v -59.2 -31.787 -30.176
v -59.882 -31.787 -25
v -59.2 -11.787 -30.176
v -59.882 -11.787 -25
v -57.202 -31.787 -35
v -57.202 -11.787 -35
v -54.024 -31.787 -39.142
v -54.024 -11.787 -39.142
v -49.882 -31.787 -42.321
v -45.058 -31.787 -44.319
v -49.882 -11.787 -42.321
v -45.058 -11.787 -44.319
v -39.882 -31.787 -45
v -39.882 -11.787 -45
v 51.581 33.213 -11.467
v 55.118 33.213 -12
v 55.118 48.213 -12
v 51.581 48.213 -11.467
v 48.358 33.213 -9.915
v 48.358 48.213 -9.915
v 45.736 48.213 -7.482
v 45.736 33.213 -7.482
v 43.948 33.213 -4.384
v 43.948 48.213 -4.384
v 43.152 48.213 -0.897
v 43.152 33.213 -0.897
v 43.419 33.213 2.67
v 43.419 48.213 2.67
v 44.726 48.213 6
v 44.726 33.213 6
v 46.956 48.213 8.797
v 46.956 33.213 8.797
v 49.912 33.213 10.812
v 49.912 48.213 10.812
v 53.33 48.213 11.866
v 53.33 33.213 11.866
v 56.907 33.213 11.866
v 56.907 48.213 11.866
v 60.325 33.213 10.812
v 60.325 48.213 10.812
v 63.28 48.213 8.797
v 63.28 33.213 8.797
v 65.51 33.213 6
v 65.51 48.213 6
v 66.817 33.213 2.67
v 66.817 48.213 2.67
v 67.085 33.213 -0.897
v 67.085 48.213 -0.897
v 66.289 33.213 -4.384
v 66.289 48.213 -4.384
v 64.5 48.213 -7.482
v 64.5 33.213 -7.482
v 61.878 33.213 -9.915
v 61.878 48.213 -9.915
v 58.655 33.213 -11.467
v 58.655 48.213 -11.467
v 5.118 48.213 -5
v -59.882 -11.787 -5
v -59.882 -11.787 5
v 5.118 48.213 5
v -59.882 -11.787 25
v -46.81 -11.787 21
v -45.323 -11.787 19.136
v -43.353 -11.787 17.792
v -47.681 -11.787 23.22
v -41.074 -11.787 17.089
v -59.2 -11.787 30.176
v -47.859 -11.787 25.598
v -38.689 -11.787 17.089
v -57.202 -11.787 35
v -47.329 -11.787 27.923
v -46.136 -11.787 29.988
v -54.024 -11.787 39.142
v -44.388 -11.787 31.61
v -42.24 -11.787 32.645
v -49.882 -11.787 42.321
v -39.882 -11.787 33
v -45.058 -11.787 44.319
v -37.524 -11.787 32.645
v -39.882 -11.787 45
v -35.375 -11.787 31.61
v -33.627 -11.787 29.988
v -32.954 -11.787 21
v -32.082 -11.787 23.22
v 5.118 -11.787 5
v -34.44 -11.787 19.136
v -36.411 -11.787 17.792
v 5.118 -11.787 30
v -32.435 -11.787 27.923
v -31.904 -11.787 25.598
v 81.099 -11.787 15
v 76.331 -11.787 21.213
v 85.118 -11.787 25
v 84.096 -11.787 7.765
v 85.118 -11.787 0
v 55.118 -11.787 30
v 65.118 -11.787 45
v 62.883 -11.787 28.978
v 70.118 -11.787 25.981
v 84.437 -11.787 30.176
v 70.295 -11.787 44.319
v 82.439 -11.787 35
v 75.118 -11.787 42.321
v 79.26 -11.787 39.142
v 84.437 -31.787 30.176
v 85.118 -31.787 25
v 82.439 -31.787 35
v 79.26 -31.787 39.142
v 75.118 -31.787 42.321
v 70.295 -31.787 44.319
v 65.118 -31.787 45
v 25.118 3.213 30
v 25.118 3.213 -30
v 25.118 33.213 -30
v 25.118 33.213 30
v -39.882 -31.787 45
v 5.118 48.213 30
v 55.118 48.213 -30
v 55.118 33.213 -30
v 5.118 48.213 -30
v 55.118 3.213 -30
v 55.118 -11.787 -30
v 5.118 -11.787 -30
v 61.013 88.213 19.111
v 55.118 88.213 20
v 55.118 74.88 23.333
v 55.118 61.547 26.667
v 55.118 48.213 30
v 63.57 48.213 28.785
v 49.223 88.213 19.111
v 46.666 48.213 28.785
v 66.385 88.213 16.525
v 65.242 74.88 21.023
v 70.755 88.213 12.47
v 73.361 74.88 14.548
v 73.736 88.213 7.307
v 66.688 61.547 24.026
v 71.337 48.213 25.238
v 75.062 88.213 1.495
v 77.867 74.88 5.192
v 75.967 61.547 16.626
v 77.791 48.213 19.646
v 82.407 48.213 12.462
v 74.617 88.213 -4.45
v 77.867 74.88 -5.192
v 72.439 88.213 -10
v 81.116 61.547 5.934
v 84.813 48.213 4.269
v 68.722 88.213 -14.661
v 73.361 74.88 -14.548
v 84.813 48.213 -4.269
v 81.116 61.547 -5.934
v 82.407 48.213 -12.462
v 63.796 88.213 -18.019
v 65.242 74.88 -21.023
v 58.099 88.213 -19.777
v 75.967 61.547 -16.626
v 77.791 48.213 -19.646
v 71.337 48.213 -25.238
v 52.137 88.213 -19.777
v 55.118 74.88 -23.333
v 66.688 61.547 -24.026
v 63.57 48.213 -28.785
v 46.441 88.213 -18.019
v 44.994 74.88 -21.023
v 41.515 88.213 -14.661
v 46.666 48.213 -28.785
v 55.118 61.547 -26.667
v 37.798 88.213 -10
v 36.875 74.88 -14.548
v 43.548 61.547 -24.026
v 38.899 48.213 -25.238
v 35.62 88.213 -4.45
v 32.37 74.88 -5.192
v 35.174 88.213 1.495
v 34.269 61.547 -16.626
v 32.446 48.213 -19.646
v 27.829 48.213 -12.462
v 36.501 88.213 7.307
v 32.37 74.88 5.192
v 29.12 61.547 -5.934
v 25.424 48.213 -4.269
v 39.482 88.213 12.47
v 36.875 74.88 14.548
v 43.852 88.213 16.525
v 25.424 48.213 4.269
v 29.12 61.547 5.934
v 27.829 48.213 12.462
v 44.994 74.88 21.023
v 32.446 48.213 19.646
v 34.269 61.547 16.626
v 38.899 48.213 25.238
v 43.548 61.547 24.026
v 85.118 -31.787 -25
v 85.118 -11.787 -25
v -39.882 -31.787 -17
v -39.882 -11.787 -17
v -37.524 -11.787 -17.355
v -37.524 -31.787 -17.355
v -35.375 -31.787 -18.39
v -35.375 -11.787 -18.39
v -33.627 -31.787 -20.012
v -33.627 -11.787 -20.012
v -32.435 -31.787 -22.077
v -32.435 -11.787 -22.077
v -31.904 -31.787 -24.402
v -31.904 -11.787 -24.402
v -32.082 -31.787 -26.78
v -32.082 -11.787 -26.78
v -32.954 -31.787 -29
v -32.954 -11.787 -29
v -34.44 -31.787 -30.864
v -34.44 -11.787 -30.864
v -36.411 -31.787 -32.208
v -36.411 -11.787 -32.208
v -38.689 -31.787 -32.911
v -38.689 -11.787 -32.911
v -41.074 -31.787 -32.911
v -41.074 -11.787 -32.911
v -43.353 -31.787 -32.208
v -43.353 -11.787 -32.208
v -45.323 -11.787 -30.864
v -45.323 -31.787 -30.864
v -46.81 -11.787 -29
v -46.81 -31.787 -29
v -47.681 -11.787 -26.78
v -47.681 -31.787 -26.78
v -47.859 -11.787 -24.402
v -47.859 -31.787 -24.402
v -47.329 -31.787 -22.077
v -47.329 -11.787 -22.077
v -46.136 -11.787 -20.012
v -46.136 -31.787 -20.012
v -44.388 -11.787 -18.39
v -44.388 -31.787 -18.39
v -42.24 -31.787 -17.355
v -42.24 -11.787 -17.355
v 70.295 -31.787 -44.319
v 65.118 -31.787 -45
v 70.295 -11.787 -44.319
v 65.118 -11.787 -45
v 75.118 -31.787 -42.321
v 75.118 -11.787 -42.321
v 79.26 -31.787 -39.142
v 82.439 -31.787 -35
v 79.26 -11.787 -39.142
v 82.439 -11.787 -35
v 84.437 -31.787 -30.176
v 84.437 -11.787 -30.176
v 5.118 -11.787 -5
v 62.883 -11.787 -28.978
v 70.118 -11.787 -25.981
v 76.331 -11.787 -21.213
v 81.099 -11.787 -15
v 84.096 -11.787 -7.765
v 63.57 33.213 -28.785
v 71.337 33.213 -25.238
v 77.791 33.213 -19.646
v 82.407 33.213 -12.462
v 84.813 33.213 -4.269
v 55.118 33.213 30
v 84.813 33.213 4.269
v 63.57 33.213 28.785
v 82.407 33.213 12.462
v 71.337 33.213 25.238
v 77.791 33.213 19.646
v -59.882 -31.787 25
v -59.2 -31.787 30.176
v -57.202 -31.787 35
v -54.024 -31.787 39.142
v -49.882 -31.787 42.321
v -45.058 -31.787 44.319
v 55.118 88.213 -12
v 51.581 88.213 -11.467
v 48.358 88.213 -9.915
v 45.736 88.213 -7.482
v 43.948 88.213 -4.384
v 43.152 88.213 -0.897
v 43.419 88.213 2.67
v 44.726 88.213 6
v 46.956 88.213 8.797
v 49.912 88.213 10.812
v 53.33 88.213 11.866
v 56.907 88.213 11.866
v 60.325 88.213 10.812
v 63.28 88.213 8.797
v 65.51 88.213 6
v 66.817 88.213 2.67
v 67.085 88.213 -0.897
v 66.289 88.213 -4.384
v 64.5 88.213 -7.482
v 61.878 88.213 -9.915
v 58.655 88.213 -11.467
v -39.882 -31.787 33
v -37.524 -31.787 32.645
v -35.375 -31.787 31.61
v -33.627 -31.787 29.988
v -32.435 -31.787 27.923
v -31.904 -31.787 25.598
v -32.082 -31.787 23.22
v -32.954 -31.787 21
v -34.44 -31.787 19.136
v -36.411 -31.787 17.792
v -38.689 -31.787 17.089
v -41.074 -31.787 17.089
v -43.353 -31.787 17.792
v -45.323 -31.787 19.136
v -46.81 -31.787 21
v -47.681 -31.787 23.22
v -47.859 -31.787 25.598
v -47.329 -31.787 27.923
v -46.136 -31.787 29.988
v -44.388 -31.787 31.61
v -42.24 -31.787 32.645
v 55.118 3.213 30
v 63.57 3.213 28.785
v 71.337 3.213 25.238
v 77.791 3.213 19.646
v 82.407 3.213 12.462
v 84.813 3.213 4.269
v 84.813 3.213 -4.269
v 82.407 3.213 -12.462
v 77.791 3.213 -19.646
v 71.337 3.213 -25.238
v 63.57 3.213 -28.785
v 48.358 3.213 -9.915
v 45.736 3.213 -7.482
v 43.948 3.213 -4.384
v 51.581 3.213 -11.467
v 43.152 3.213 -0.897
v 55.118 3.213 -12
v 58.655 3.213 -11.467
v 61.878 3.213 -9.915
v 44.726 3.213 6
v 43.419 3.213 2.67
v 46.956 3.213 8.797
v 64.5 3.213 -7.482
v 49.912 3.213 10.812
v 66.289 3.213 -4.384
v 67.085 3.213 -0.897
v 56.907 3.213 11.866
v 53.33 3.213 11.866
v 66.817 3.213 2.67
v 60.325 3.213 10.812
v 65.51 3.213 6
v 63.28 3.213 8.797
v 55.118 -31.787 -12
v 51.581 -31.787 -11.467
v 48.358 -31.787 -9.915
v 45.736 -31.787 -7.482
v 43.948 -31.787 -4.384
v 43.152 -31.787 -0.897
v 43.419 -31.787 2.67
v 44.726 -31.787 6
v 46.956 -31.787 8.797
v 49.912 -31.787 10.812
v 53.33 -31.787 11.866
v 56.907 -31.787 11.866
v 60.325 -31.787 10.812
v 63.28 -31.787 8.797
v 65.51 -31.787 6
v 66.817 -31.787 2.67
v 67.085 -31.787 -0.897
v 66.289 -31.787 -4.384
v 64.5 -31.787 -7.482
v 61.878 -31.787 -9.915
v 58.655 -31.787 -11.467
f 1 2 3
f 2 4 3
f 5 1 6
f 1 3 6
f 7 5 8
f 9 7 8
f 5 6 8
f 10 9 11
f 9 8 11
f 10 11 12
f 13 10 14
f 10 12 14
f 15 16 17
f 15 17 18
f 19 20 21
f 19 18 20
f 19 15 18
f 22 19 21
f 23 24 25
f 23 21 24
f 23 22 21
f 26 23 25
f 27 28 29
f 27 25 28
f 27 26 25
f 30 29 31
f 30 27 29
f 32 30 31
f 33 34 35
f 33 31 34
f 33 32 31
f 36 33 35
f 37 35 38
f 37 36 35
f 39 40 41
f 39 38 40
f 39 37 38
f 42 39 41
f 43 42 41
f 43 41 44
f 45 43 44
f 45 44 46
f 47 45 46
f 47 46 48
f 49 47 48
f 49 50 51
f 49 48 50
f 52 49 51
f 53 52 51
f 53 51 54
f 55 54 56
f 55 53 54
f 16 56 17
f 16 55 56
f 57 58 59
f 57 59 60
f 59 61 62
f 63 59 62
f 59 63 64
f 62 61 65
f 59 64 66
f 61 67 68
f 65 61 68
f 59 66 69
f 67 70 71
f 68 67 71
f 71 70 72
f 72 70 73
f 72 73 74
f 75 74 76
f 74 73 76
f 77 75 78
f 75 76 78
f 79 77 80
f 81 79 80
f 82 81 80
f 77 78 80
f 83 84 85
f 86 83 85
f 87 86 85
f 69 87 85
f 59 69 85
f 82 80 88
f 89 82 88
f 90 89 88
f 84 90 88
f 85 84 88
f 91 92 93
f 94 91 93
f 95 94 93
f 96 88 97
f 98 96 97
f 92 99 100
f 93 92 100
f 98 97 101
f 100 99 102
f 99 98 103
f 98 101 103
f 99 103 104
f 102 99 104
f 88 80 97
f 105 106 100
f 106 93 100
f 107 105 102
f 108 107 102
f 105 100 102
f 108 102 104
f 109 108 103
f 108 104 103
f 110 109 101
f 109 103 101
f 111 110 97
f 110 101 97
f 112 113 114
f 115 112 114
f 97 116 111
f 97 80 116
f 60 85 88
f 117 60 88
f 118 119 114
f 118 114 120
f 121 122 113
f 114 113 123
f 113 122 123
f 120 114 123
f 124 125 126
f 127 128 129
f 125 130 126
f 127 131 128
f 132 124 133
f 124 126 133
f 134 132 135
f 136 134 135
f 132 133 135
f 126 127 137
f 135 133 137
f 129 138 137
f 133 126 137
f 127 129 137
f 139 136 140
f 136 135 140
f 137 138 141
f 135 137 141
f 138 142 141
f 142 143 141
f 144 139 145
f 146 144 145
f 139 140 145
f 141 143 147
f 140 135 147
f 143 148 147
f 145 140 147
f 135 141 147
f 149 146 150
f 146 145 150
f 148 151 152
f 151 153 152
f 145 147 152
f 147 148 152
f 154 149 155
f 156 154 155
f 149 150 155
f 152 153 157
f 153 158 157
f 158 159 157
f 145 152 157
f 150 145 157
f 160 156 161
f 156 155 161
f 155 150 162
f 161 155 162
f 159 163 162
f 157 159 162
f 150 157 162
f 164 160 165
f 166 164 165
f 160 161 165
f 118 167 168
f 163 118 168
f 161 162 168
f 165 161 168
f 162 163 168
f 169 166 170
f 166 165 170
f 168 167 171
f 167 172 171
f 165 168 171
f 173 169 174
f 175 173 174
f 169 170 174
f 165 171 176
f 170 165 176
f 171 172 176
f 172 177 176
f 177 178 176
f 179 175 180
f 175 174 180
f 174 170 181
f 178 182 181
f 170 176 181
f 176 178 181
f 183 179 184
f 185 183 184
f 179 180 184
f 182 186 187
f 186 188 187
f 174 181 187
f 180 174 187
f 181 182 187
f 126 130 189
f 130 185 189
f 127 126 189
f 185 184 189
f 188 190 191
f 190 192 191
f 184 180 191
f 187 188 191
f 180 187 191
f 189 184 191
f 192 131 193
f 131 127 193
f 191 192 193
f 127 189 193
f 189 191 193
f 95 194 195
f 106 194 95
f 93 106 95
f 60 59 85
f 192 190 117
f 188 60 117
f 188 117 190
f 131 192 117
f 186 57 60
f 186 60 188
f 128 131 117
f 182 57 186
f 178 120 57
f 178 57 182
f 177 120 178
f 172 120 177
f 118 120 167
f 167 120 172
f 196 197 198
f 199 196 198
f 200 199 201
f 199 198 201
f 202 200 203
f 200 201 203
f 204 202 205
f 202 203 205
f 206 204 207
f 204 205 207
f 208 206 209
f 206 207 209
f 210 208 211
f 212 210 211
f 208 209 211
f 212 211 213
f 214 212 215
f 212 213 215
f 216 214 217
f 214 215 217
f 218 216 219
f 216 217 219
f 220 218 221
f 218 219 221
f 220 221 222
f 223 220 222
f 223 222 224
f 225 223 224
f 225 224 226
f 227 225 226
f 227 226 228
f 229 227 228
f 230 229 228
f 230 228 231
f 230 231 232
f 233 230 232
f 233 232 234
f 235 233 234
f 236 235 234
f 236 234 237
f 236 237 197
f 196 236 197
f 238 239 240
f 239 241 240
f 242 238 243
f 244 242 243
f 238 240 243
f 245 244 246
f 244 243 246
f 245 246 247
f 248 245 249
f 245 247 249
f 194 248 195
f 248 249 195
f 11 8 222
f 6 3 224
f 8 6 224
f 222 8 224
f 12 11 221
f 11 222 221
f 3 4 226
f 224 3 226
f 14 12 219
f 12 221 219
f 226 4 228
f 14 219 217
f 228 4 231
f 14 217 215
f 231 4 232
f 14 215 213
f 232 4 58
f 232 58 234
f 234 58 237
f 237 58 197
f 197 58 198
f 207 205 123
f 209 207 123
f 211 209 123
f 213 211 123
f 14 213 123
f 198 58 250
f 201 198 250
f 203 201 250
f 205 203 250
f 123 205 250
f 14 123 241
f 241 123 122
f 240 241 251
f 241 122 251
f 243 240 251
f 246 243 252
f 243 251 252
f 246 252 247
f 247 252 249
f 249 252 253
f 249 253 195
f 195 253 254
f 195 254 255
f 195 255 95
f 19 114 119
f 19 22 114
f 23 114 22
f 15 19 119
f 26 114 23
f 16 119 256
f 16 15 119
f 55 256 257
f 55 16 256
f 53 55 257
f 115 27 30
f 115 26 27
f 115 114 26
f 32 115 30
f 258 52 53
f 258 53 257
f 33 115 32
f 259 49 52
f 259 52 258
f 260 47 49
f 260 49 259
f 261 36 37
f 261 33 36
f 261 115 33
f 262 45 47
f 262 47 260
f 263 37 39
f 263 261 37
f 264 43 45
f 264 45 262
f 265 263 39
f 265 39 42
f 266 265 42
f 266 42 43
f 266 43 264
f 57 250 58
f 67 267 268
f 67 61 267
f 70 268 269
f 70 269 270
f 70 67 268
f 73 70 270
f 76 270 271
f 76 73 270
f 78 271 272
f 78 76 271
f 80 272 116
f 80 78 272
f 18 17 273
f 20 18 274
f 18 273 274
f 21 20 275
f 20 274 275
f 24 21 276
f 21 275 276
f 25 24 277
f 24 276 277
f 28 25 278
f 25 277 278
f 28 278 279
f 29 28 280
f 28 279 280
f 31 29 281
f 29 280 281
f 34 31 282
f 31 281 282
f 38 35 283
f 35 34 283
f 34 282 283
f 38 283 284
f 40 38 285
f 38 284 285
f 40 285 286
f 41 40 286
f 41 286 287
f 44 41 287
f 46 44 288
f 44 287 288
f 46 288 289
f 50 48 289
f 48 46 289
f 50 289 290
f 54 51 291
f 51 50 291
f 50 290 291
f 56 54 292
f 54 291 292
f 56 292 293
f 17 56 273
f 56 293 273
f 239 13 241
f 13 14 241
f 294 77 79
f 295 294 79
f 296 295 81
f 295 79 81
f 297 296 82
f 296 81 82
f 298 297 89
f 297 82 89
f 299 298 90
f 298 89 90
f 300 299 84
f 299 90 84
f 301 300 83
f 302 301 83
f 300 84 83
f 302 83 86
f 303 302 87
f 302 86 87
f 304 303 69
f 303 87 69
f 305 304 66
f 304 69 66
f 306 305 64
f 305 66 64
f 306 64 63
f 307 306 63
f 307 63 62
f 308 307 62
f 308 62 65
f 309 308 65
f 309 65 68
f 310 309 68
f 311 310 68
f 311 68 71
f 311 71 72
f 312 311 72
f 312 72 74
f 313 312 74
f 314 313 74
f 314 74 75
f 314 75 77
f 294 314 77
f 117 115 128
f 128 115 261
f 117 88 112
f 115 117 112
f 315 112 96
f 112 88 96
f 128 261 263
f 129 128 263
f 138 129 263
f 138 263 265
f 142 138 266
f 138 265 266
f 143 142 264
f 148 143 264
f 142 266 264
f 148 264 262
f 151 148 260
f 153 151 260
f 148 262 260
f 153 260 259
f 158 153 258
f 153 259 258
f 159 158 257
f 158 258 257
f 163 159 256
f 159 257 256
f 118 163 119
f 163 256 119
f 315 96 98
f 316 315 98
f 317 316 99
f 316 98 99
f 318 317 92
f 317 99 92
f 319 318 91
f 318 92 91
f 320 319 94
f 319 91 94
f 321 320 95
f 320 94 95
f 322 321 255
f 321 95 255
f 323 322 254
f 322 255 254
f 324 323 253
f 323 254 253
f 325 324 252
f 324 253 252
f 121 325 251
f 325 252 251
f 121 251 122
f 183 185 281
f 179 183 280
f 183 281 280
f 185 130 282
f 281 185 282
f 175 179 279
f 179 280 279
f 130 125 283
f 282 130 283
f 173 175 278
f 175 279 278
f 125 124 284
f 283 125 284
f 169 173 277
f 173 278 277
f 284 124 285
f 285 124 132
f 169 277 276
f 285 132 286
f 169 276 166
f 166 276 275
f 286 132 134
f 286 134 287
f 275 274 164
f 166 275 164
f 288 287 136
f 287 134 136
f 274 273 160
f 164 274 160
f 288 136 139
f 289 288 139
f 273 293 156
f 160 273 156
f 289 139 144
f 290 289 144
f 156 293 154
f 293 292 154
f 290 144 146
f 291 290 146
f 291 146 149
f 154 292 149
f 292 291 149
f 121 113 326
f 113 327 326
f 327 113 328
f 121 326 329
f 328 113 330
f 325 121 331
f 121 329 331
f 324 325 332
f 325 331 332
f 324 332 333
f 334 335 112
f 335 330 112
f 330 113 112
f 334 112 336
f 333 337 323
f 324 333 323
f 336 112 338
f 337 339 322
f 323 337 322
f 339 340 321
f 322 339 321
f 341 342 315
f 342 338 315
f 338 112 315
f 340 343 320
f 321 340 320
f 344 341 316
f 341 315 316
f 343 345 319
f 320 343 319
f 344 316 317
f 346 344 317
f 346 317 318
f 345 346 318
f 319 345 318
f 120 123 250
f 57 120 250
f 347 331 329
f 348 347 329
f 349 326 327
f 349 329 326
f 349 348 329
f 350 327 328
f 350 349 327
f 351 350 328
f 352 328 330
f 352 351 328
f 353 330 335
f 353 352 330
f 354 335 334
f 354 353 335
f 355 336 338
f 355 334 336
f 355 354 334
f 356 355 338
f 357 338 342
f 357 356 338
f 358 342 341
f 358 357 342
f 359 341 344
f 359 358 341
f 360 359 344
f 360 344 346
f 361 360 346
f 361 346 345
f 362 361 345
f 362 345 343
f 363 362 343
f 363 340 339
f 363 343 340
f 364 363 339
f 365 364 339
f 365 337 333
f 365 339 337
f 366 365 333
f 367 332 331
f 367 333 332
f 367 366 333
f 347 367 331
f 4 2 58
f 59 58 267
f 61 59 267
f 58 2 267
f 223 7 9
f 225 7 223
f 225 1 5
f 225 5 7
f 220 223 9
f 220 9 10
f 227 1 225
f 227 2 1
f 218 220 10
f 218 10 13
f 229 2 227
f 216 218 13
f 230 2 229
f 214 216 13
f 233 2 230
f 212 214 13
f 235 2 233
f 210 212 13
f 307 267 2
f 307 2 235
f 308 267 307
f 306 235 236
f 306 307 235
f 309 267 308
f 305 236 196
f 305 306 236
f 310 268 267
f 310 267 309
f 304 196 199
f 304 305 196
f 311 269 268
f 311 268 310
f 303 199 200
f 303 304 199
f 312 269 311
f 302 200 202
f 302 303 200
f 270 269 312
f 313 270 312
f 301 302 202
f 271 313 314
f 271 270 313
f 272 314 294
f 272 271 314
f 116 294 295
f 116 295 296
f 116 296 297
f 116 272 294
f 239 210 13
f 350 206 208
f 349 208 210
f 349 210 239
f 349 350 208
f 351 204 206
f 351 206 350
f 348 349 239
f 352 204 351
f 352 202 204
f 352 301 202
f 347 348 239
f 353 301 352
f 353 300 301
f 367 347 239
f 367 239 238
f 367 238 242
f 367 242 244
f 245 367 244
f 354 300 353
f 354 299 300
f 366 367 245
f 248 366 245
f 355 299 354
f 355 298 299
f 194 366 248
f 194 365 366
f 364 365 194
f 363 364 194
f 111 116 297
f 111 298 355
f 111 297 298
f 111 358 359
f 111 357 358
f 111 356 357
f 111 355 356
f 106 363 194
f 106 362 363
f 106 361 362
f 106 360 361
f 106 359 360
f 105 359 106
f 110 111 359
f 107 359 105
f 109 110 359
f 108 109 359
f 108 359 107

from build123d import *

# Parameters (mm, degrees)
SKETCH3_W               = 145
SKETCH3_H               = 20
BOSS_EXTRUDE3_DEPTH     = 45
BOSS_EXTRUDE6_DEPTH     = 60
CUT_EXTRUDE6_DEPTH      = 110.861912755
CUT_EXTRUDE6_DEPTH_BACK = 10
SKETCH10_W              = 60
SKETCH10_H              = 30
CUT_EXTRUDE7_DEPTH      = 90
CUT_EXTRUDE9_DEPTH      = 84
CUT_EXTRUDE9_DEPTH_BACK = 59
SKETCH11_R              = 12
SKETCH15_R              = 12
CUT_EXTRUDE10_DEPTH     = 40
SKETCH16_R              = 8
CUT_EXTRUDE11_DEPTH     = 40
FILLET1_R               = 20
FILLET2_R               = 20
FILLET3_R               = 20
FILLET4_R               = 20


with BuildPart() as part:
    # Sketch3 → Boss-Extrude3 (new, symmetric)
    with BuildSketch(Plane.XY):
        with Locations((12.618187605, -21.786578497)):
            Rectangle(SKETCH3_W, SKETCH3_H)
    extrude(amount=BOSS_EXTRUDE3_DEPTH, both=True)

    # Sketch4 → Boss-Extrude6 (add)
    with BuildSketch(Plane(origin=(0, -11.786578497, 0), x_dir=(1, 0, 0), z_dir=(0, 1, 0))):
        Polygon((5.118187605, 5), (-59.881812395, 5), (-59.881812395, -5), (5.118187605, -5), (5.118187605, 0), align=None)
        with BuildLine():
            Line((5.118187605, -30), (55.118187605, -30))
            ThreePointArc((55.118187605, -30), (85.118187605, 0), (55.118187605, 30))
            Line((55.118187605, 30), (5.118187605, 30))
            Line((5.118187605, 30), (5.118187605, 0))
            Line((5.118187605, 0), (5.118187605, -30))
        make_face()
    extrude(amount=BOSS_EXTRUDE6_DEPTH)

    # Sketch7 → Cut-Extrude6 (cut, two sides: drawn at the far end of the back side and taken through both)
    with BuildSketch(Plane.XY.offset(5).offset(-CUT_EXTRUDE6_DEPTH_BACK)):
        Polygon((-297.845774457, -231.445620401), (-59.881812395, -11.786578497), (5.118187605, 48.213421503), (243.082149668, 267.872463407), (-196.23593414, 743.800387532), (-737.163858265, 244.482303724), align=None)
    extrude(amount=CUT_EXTRUDE6_DEPTH + CUT_EXTRUDE6_DEPTH_BACK, mode=Mode.SUBTRACT)

    # Sketch10 → Cut-Extrude7 (cut)
    with BuildSketch(Plane.XY.offset(30)):
        with Locations((55.118187605, 18.213421503)):
            Rectangle(SKETCH10_W, SKETCH10_H)
    extrude(amount=-CUT_EXTRUDE7_DEPTH, mode=Mode.SUBTRACT)

    # Sketch11 → Cut-Extrude9 (cut, two sides: drawn at the far end of the back side and taken through both)
    with BuildSketch(Plane(origin=(0, 3.213421503, 0), x_dir=(1, 0, 0), z_dir=(0, 1, 0)).offset(-CUT_EXTRUDE9_DEPTH_BACK)):
        with Locations(Location((55.118187605, 0, 0), (0, 0, 90))):
            Circle(SKETCH11_R)
    extrude(amount=CUT_EXTRUDE9_DEPTH + CUT_EXTRUDE9_DEPTH_BACK, mode=Mode.SUBTRACT)

    # Sketch13 → Revolve1 (revolve)
    with BuildSketch(Plane.XY, mode=Mode.PRIVATE) as revolve1_sk:
        Polygon((55.118187605, 48.213421503), (55.118187605, 88.213421503), (35.118187605, 88.213421503), (25.118187605, 48.213421503), align=None)
    revolve(revolve1_sk.sketch.rotate(Axis((55.118187605, 48.213421503, 0), (0, 1, 0)), 90), axis=Axis((55.118187605, 48.213421503, 0), (0, 1, 0)))

    # Sketch15 → Cut-Extrude10 (cut)
    with BuildSketch(Plane(origin=(0, 88.213421503, 0), x_dir=(1, 0, 0), z_dir=(0, 1, 0))):
        with Locations(Location((55.118187605, 0, 0), (0, 0, 90))):
            Circle(SKETCH15_R)
    extrude(amount=-CUT_EXTRUDE10_DEPTH, mode=Mode.SUBTRACT)

    # Sketch16 → Cut-Extrude11 (cut)
    with BuildSketch(Plane(origin=(0, -11.786578497, 0), x_dir=(1, 0, 0), z_dir=(0, 1, 0))):
        with Locations(Location((-39.881812395, -25, 0), (0, 0, 270))):
            Circle(SKETCH16_R)
        with Locations(Location((-39.881812395, 25, 0), (0, 0, 270))):
            Circle(SKETCH16_R)
    extrude(amount=-CUT_EXTRUDE11_DEPTH, mode=Mode.SUBTRACT)

    # Fillet1
    fillet1_edges = [part.edges().sort_by_distance(p)[0] for p in [
        (-59.881812395, -21.786578497, 45),
    ]]
    fillet(fillet1_edges, radius=FILLET1_R)

    # Fillet2
    fillet2_edges = [part.edges().sort_by_distance(p)[0] for p in [
        (-59.881812395, -21.786578497, -45),
    ]]
    fillet(fillet2_edges, radius=FILLET2_R)

    # Fillet3
    fillet3_edges = [part.edges().sort_by_distance(p)[0] for p in [
        (85.118187605, -21.786578497, -45),
    ]]
    fillet(fillet3_edges, radius=FILLET3_R)

    # Fillet4
    fillet4_edges = [part.edges().sort_by_distance(p)[0] for p in [
        (85.118187605, -21.786578497, 45),
    ]]
    fillet(fillet4_edges, radius=FILLET4_R)


solid = part.part
